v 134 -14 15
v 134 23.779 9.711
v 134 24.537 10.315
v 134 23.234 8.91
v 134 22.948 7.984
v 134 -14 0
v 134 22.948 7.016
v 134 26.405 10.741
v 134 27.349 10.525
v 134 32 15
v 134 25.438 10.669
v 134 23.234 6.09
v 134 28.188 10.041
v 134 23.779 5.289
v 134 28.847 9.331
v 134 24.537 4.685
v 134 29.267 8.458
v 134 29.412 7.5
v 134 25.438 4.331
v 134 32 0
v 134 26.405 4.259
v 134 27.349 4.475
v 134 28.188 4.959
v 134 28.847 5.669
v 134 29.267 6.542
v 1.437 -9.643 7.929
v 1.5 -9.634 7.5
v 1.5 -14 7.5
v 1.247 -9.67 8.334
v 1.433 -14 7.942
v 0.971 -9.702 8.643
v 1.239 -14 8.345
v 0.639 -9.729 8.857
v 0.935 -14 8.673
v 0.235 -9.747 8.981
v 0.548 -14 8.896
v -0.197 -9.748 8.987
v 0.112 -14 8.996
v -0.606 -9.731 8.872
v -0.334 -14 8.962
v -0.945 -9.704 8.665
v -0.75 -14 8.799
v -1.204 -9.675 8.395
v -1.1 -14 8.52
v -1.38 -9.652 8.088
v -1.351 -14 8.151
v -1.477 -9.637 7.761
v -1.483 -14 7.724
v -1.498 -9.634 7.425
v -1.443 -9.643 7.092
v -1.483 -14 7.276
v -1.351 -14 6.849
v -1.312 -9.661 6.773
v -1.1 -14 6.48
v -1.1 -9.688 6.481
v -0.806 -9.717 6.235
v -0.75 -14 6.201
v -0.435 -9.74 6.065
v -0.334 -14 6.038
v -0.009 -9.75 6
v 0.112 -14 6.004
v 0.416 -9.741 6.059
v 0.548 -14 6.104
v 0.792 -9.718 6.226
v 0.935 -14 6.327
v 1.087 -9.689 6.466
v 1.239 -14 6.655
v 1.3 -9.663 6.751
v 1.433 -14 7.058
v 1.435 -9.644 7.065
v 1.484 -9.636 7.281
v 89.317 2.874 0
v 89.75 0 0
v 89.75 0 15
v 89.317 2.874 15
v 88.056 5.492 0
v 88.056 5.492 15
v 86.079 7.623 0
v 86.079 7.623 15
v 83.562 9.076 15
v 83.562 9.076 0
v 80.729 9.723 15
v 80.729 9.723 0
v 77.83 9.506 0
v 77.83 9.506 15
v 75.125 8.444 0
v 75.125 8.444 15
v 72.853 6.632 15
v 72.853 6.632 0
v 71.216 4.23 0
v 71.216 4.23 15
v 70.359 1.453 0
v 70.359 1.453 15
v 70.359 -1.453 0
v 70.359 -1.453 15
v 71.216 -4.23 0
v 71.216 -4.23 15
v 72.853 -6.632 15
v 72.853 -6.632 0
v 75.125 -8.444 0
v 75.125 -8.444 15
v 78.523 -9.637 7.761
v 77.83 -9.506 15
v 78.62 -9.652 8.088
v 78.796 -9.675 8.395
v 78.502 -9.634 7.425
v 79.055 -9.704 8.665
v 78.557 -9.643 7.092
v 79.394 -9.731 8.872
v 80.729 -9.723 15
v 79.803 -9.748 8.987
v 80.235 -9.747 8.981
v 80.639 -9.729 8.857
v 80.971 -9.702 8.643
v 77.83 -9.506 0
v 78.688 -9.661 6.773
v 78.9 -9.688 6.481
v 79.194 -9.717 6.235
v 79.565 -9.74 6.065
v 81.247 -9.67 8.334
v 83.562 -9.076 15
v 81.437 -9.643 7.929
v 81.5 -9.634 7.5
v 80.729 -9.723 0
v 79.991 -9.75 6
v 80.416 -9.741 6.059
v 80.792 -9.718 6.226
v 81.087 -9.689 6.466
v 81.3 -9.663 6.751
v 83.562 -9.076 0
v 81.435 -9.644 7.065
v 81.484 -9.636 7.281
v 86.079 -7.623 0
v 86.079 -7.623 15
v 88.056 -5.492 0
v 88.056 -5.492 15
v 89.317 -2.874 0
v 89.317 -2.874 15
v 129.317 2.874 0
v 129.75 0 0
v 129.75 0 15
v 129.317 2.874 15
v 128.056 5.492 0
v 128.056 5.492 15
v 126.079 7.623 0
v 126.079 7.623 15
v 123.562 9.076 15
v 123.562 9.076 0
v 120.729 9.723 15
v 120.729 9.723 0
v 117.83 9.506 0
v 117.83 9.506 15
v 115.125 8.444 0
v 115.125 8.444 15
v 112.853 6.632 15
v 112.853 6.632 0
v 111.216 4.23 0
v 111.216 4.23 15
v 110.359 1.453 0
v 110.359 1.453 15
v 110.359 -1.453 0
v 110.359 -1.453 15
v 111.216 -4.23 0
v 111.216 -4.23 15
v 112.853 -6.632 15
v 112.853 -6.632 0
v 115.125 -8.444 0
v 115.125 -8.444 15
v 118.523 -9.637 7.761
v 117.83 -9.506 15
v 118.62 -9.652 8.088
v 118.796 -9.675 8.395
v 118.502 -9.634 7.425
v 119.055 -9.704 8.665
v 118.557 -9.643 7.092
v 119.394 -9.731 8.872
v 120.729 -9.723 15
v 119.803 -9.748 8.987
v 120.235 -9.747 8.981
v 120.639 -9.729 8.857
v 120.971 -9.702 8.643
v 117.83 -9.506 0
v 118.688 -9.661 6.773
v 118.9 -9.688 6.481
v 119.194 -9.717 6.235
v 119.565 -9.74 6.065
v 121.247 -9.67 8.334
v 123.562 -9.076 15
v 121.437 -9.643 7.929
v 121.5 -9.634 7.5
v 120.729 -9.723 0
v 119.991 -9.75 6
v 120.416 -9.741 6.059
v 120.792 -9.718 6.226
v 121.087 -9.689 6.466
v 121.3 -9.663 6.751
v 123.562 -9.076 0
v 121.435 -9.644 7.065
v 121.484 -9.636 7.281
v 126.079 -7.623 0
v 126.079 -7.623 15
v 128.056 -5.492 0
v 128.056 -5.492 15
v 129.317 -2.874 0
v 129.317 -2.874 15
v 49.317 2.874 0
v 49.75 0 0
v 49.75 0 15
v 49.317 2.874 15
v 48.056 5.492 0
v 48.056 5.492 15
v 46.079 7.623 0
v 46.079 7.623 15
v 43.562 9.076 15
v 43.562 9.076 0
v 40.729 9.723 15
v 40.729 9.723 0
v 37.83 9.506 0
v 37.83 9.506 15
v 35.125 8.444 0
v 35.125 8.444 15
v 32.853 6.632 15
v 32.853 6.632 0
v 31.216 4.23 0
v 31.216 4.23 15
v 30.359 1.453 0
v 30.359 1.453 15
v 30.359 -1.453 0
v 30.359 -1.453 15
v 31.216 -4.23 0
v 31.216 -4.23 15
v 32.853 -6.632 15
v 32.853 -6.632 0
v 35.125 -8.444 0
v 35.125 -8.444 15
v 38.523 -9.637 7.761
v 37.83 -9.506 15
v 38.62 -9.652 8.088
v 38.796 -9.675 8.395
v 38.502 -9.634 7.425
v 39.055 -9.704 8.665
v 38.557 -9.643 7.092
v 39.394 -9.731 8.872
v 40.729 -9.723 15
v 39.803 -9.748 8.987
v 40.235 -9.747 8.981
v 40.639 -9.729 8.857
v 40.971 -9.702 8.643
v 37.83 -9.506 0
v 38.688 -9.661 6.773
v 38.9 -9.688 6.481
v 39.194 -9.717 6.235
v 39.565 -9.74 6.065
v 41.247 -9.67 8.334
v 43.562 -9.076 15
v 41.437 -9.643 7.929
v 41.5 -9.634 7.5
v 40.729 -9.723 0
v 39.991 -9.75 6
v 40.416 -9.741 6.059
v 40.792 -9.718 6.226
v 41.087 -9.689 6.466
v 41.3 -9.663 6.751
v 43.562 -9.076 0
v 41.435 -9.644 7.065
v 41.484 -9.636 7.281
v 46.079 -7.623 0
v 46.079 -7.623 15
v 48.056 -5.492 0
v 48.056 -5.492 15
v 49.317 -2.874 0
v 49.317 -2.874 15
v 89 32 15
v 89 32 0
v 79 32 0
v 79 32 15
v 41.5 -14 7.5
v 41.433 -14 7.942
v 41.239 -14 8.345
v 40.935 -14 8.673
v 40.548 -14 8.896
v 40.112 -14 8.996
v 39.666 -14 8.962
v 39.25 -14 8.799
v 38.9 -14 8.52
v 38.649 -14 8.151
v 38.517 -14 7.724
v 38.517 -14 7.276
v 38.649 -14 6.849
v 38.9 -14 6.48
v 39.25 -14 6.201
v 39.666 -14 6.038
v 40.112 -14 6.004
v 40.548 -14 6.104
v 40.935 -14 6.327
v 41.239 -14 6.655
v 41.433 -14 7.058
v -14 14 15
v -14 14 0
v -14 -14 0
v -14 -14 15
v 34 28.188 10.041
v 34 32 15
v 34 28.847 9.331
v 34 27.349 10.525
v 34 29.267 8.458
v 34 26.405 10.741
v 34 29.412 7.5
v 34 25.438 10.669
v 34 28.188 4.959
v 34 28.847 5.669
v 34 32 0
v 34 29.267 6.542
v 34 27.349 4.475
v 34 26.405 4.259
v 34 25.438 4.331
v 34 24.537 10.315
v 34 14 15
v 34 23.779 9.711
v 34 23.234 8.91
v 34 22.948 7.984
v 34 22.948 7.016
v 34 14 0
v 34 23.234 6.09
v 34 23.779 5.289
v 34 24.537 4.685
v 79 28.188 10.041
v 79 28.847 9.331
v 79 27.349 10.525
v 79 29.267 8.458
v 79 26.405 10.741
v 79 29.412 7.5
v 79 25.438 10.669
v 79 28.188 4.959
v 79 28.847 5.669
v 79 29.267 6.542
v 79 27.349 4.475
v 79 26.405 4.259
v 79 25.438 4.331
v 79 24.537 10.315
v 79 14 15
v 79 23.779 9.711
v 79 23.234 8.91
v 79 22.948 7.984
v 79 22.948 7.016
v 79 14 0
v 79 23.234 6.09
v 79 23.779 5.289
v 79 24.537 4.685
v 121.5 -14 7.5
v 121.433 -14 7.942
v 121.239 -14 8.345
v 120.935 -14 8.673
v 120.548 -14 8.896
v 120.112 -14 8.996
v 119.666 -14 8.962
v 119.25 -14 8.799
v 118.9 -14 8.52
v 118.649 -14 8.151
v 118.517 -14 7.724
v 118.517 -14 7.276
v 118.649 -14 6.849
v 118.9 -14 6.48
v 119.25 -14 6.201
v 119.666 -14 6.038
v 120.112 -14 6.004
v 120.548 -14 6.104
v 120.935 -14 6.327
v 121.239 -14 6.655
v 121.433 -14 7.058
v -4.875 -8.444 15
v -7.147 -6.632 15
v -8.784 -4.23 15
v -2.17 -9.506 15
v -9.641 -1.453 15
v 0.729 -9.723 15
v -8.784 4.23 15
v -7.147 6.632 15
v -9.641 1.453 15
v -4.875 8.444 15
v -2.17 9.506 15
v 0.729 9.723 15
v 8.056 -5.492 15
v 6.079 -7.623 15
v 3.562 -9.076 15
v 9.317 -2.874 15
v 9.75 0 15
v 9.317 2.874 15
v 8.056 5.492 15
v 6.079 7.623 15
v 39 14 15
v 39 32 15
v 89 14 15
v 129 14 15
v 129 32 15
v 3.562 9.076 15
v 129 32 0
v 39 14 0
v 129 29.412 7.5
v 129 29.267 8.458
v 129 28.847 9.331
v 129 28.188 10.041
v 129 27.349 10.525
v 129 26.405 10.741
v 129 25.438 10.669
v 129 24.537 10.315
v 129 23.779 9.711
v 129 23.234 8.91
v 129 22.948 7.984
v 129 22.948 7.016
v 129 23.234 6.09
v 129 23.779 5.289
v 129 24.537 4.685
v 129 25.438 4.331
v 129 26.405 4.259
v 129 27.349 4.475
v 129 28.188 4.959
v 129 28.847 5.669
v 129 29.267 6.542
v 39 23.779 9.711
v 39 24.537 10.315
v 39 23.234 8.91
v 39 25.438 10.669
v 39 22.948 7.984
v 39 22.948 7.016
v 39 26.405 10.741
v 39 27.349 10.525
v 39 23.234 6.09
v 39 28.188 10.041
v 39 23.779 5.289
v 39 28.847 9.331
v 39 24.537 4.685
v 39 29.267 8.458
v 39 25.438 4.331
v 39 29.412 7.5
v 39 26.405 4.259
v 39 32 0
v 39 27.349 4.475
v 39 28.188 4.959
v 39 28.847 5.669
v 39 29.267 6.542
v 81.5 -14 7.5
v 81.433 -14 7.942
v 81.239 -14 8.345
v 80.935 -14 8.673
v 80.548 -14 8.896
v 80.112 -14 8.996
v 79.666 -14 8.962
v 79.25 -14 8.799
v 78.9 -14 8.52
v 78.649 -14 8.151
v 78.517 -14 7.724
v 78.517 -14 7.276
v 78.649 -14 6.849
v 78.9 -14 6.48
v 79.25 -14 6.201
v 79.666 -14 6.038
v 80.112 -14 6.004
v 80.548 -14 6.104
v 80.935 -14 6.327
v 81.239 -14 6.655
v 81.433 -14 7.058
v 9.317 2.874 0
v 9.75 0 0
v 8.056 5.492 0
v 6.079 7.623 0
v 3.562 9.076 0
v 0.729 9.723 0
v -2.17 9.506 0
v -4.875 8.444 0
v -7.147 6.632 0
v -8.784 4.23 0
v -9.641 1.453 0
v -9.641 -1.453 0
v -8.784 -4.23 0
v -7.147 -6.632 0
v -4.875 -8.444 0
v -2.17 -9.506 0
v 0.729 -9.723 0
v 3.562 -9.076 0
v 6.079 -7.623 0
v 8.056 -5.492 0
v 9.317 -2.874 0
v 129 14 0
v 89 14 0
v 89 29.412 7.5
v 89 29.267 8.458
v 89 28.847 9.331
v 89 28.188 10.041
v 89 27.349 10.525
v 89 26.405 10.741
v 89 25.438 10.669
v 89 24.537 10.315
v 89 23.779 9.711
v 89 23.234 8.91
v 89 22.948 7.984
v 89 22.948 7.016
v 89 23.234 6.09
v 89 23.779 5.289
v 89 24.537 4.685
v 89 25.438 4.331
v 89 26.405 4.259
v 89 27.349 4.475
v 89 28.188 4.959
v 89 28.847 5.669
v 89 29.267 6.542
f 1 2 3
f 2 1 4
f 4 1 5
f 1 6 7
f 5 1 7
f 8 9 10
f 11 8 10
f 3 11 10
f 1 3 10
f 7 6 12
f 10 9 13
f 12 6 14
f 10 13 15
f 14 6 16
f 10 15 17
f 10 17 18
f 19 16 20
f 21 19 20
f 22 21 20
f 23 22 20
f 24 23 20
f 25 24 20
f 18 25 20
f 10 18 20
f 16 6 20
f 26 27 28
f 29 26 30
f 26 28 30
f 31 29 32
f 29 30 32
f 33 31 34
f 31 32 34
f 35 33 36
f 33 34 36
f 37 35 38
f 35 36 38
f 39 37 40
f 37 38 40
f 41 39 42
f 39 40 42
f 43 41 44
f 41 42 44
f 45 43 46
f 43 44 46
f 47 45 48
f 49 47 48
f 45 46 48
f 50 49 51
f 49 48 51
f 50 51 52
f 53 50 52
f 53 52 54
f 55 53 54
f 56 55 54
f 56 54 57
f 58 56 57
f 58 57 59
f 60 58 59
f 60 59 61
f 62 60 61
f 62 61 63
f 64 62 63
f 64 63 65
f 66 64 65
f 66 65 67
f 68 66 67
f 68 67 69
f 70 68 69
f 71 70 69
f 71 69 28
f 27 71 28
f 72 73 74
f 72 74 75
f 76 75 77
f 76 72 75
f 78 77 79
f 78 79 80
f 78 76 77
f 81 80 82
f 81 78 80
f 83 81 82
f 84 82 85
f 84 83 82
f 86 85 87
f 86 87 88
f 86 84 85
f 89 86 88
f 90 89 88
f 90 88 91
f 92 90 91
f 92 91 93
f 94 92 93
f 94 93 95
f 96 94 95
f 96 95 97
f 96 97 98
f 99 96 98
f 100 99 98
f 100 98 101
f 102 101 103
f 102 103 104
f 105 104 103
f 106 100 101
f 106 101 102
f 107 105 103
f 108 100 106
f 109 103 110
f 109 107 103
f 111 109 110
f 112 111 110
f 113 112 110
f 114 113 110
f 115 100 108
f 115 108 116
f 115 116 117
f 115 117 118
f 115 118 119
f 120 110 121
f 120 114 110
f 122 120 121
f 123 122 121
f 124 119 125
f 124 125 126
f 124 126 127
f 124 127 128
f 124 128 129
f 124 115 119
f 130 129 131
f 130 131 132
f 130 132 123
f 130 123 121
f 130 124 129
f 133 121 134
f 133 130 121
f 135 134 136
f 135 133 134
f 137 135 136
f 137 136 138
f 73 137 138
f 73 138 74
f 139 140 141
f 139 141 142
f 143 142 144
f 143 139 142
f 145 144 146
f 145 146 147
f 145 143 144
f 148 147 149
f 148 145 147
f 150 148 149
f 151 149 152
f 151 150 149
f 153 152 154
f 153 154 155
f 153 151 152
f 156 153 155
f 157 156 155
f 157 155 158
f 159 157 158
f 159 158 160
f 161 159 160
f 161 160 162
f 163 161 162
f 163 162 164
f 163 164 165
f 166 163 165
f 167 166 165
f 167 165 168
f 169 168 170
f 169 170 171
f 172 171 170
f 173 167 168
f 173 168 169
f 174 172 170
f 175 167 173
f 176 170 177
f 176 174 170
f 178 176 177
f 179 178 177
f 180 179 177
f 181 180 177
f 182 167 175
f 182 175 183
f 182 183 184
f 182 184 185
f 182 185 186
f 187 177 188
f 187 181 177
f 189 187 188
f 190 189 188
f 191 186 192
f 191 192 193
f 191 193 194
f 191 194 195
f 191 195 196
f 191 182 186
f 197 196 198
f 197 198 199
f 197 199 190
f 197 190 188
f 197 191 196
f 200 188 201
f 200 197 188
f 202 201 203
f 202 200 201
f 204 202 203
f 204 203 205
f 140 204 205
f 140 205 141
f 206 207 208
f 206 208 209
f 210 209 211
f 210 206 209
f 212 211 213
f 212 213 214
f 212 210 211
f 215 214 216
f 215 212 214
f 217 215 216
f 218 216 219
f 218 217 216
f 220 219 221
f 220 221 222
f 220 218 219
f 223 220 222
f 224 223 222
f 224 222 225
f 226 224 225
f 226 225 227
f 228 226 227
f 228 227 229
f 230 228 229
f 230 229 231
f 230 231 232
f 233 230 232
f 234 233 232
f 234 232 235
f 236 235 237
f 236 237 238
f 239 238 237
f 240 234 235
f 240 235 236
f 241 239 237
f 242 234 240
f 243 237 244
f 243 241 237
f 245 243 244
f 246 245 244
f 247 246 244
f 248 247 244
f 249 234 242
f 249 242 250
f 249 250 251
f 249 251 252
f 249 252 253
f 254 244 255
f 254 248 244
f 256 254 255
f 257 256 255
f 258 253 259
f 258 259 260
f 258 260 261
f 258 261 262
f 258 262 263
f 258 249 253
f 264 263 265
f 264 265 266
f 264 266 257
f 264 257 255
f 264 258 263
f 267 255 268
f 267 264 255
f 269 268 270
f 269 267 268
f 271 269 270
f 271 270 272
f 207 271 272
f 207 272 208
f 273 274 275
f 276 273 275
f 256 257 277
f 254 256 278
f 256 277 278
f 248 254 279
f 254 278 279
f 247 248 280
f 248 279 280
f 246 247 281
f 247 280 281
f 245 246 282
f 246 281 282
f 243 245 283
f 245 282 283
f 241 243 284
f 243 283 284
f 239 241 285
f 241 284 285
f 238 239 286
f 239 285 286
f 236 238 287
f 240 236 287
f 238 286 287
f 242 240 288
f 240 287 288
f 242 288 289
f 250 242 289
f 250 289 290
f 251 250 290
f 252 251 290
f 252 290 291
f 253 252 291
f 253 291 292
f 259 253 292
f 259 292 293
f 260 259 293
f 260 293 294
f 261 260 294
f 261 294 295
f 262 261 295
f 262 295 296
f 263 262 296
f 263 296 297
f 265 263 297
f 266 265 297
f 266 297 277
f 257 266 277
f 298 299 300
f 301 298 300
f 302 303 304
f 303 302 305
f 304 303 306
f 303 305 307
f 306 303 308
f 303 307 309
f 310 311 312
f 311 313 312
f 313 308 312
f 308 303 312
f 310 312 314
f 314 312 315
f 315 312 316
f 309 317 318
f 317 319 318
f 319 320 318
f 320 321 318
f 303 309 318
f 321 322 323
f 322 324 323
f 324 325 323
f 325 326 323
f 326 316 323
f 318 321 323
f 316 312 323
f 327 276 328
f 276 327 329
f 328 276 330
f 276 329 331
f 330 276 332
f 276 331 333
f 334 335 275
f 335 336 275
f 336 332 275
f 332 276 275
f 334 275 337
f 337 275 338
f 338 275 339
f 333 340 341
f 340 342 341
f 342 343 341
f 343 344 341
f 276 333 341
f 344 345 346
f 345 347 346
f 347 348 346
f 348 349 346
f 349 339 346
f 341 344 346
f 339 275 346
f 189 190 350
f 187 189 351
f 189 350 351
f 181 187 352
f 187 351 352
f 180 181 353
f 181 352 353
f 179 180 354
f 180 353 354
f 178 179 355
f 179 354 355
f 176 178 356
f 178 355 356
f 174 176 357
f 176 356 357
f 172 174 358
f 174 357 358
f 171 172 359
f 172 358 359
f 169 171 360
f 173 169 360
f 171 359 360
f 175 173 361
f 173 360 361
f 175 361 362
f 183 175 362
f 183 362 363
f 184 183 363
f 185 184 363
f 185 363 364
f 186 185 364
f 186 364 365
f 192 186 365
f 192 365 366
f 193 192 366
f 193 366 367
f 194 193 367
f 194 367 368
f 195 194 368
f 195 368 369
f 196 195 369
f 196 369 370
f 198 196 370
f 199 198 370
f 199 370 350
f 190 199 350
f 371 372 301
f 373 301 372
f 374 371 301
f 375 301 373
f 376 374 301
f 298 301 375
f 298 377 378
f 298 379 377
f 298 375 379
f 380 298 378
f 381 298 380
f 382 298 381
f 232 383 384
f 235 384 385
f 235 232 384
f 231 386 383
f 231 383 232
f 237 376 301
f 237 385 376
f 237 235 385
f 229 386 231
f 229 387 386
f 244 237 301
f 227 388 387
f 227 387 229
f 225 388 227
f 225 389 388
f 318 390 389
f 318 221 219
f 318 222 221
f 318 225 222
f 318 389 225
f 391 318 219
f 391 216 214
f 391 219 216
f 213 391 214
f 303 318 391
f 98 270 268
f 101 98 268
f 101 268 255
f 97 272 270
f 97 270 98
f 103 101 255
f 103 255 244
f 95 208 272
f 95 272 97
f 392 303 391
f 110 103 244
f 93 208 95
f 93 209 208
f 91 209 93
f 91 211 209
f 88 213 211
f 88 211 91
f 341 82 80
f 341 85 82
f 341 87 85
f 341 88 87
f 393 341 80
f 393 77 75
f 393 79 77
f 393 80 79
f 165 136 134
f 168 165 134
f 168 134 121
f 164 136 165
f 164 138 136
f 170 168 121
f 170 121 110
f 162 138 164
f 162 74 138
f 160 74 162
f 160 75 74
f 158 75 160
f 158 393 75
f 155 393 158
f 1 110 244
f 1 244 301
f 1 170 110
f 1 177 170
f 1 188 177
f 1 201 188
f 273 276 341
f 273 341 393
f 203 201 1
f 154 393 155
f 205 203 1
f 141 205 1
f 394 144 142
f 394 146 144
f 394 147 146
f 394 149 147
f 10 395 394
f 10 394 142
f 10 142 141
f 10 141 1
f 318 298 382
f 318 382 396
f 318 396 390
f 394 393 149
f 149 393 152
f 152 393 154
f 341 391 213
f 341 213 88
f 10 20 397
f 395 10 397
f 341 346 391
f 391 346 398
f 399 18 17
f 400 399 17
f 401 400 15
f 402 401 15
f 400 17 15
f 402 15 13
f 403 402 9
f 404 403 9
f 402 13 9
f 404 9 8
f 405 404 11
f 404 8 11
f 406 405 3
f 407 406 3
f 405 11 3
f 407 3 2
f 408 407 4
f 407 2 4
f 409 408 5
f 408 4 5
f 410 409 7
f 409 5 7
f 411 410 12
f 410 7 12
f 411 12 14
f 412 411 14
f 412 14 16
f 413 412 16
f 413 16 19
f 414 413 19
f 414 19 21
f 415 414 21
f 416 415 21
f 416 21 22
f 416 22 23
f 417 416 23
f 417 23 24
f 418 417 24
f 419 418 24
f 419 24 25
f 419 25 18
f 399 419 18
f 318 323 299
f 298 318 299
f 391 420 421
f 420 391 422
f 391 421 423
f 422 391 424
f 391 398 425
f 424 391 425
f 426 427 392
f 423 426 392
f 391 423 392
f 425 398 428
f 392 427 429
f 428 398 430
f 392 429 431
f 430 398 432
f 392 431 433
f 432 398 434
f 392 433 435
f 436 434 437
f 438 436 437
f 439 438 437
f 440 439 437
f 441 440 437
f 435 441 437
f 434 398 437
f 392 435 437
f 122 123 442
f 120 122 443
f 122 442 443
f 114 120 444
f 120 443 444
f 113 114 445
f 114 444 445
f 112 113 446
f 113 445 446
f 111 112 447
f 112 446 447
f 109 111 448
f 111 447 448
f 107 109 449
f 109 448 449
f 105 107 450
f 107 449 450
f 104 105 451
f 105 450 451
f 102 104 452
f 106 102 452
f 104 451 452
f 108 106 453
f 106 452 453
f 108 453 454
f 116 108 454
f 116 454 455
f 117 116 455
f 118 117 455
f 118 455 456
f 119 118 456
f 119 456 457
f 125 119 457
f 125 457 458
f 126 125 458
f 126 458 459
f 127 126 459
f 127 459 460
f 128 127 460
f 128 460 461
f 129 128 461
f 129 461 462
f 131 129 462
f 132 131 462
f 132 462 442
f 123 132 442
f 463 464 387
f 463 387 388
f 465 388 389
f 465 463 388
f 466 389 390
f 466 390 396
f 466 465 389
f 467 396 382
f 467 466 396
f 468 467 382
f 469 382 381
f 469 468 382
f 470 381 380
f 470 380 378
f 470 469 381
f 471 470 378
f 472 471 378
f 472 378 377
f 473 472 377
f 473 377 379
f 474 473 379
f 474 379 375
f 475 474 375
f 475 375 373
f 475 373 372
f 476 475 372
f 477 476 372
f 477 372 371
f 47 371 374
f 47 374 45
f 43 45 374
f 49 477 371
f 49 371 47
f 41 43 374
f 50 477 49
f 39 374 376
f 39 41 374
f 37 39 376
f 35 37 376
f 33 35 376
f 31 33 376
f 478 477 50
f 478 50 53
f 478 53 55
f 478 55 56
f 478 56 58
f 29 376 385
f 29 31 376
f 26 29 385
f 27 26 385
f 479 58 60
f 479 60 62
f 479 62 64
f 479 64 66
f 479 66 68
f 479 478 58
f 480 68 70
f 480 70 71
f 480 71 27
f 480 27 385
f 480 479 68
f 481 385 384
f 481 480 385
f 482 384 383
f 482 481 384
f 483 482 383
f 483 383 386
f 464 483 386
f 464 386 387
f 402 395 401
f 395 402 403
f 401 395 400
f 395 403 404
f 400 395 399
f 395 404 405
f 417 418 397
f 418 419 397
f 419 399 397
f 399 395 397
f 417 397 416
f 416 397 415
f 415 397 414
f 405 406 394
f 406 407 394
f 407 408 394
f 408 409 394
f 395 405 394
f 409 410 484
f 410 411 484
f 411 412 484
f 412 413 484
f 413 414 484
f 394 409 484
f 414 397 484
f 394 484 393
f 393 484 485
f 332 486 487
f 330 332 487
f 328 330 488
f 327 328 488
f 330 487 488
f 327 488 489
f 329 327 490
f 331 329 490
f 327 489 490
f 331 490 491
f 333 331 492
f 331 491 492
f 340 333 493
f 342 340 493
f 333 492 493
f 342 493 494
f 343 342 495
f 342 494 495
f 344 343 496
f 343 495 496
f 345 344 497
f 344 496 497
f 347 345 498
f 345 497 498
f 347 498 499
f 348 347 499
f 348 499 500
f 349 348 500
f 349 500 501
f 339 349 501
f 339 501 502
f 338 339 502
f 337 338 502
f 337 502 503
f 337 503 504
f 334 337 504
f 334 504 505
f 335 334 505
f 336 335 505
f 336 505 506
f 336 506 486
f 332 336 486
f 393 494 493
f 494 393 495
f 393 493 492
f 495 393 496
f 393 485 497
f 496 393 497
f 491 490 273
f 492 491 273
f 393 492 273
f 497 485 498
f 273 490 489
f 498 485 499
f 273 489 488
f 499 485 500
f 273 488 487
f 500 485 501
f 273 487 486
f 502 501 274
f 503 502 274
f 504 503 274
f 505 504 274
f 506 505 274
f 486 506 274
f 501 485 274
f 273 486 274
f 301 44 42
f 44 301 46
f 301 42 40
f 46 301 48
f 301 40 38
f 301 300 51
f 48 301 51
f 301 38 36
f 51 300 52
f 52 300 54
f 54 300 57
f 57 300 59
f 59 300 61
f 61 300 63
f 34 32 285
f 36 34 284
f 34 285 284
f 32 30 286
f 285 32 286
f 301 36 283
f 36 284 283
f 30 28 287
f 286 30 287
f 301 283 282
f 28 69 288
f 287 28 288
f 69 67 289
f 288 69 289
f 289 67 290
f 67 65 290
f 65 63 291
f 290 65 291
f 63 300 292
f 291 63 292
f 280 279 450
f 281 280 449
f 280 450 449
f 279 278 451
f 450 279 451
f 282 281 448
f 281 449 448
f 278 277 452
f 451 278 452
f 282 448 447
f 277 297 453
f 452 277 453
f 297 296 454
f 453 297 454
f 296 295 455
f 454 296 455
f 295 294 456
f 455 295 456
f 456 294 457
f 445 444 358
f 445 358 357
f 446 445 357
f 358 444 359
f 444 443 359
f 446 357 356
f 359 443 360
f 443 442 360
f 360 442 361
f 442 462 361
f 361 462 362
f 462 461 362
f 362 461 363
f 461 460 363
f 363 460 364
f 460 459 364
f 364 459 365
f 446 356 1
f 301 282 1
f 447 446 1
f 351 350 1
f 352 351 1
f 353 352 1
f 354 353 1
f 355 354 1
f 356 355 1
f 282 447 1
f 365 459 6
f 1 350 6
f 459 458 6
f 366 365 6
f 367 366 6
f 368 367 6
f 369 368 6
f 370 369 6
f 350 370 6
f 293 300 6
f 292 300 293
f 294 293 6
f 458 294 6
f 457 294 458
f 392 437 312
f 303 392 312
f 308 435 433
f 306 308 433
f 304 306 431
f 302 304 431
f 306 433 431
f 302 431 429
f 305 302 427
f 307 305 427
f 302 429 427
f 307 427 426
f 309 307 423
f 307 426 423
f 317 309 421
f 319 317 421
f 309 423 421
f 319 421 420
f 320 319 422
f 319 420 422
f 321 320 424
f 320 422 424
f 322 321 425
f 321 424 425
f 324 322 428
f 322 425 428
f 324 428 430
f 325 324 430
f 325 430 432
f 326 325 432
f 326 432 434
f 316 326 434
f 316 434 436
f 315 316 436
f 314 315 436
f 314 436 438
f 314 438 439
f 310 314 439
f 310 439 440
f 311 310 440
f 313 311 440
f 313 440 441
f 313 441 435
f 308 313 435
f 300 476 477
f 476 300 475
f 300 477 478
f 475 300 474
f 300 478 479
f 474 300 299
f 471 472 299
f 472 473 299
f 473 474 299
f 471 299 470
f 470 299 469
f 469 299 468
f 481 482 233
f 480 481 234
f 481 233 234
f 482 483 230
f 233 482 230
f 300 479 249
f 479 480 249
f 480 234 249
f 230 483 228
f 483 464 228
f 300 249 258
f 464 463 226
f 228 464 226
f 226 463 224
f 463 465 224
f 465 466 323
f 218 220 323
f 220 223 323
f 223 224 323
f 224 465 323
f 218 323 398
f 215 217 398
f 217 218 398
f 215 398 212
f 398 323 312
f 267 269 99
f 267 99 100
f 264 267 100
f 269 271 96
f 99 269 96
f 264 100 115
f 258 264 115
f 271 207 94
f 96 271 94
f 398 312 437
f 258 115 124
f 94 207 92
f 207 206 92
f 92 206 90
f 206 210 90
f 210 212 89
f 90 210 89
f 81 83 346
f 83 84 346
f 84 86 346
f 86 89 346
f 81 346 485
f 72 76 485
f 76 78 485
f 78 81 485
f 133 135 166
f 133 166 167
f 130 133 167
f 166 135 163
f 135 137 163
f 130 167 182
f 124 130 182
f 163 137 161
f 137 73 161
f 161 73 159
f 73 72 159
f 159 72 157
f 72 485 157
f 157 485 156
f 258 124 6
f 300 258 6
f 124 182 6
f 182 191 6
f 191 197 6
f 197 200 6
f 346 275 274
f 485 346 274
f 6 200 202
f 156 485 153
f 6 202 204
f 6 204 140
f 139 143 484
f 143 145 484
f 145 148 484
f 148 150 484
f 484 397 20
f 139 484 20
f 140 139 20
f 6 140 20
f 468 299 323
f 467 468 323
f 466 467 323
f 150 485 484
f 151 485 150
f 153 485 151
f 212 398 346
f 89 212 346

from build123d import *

# Parameters (mm, degrees)
F0_R     = 9.75
F1_DEPTH = 15
F2_R     = 3.25
F3_DEPTH = 125
F4_R     = 1.5
F5_DEPTH = 8


with BuildPart() as f1:
    # F0 (on Top) → F1 (new body)
    with BuildSketch(Plane.XY):
        Polygon((34, 14), (-14, 14), (-14, -14), (134, -14), (134, 14), (134, 32), (129, 32), (129, 14), (89, 14), (89, 32), (79, 32), (79, 14), (39, 14), (39, 32), (34, 32), align=None)
        Circle(F0_R, mode=Mode.SUBTRACT)
        with Locations((40, 0)):
            Circle(F0_R, mode=Mode.SUBTRACT)
        with Locations((80, 0)):
            Circle(F0_R, mode=Mode.SUBTRACT)
        with Locations((120, 0)):
            Circle(F0_R, mode=Mode.SUBTRACT)
    extrude(amount=F1_DEPTH)

    # F2 (on face) → F3 (cut)
    with BuildSketch(Plane.YZ.offset(134)):
        with Locations((26.161687, 7.5)):
            Circle(F2_R)
    extrude(amount=-F3_DEPTH, mode=Mode.SUBTRACT)

    # F4 (on face) → F5 (cut)
    with BuildSketch(Plane.XZ.offset(14)):
        with Locations((120, 7.5)):
            Circle(F4_R)
        with Locations((80, 7.5)):
            Circle(F4_R)
        with Locations((40, 7.5)):
            Circle(F4_R)
        with Locations((0, 7.5)):
            Circle(F4_R)
    extrude(amount=-F5_DEPTH, mode=Mode.SUBTRACT)


solid = f1.part
